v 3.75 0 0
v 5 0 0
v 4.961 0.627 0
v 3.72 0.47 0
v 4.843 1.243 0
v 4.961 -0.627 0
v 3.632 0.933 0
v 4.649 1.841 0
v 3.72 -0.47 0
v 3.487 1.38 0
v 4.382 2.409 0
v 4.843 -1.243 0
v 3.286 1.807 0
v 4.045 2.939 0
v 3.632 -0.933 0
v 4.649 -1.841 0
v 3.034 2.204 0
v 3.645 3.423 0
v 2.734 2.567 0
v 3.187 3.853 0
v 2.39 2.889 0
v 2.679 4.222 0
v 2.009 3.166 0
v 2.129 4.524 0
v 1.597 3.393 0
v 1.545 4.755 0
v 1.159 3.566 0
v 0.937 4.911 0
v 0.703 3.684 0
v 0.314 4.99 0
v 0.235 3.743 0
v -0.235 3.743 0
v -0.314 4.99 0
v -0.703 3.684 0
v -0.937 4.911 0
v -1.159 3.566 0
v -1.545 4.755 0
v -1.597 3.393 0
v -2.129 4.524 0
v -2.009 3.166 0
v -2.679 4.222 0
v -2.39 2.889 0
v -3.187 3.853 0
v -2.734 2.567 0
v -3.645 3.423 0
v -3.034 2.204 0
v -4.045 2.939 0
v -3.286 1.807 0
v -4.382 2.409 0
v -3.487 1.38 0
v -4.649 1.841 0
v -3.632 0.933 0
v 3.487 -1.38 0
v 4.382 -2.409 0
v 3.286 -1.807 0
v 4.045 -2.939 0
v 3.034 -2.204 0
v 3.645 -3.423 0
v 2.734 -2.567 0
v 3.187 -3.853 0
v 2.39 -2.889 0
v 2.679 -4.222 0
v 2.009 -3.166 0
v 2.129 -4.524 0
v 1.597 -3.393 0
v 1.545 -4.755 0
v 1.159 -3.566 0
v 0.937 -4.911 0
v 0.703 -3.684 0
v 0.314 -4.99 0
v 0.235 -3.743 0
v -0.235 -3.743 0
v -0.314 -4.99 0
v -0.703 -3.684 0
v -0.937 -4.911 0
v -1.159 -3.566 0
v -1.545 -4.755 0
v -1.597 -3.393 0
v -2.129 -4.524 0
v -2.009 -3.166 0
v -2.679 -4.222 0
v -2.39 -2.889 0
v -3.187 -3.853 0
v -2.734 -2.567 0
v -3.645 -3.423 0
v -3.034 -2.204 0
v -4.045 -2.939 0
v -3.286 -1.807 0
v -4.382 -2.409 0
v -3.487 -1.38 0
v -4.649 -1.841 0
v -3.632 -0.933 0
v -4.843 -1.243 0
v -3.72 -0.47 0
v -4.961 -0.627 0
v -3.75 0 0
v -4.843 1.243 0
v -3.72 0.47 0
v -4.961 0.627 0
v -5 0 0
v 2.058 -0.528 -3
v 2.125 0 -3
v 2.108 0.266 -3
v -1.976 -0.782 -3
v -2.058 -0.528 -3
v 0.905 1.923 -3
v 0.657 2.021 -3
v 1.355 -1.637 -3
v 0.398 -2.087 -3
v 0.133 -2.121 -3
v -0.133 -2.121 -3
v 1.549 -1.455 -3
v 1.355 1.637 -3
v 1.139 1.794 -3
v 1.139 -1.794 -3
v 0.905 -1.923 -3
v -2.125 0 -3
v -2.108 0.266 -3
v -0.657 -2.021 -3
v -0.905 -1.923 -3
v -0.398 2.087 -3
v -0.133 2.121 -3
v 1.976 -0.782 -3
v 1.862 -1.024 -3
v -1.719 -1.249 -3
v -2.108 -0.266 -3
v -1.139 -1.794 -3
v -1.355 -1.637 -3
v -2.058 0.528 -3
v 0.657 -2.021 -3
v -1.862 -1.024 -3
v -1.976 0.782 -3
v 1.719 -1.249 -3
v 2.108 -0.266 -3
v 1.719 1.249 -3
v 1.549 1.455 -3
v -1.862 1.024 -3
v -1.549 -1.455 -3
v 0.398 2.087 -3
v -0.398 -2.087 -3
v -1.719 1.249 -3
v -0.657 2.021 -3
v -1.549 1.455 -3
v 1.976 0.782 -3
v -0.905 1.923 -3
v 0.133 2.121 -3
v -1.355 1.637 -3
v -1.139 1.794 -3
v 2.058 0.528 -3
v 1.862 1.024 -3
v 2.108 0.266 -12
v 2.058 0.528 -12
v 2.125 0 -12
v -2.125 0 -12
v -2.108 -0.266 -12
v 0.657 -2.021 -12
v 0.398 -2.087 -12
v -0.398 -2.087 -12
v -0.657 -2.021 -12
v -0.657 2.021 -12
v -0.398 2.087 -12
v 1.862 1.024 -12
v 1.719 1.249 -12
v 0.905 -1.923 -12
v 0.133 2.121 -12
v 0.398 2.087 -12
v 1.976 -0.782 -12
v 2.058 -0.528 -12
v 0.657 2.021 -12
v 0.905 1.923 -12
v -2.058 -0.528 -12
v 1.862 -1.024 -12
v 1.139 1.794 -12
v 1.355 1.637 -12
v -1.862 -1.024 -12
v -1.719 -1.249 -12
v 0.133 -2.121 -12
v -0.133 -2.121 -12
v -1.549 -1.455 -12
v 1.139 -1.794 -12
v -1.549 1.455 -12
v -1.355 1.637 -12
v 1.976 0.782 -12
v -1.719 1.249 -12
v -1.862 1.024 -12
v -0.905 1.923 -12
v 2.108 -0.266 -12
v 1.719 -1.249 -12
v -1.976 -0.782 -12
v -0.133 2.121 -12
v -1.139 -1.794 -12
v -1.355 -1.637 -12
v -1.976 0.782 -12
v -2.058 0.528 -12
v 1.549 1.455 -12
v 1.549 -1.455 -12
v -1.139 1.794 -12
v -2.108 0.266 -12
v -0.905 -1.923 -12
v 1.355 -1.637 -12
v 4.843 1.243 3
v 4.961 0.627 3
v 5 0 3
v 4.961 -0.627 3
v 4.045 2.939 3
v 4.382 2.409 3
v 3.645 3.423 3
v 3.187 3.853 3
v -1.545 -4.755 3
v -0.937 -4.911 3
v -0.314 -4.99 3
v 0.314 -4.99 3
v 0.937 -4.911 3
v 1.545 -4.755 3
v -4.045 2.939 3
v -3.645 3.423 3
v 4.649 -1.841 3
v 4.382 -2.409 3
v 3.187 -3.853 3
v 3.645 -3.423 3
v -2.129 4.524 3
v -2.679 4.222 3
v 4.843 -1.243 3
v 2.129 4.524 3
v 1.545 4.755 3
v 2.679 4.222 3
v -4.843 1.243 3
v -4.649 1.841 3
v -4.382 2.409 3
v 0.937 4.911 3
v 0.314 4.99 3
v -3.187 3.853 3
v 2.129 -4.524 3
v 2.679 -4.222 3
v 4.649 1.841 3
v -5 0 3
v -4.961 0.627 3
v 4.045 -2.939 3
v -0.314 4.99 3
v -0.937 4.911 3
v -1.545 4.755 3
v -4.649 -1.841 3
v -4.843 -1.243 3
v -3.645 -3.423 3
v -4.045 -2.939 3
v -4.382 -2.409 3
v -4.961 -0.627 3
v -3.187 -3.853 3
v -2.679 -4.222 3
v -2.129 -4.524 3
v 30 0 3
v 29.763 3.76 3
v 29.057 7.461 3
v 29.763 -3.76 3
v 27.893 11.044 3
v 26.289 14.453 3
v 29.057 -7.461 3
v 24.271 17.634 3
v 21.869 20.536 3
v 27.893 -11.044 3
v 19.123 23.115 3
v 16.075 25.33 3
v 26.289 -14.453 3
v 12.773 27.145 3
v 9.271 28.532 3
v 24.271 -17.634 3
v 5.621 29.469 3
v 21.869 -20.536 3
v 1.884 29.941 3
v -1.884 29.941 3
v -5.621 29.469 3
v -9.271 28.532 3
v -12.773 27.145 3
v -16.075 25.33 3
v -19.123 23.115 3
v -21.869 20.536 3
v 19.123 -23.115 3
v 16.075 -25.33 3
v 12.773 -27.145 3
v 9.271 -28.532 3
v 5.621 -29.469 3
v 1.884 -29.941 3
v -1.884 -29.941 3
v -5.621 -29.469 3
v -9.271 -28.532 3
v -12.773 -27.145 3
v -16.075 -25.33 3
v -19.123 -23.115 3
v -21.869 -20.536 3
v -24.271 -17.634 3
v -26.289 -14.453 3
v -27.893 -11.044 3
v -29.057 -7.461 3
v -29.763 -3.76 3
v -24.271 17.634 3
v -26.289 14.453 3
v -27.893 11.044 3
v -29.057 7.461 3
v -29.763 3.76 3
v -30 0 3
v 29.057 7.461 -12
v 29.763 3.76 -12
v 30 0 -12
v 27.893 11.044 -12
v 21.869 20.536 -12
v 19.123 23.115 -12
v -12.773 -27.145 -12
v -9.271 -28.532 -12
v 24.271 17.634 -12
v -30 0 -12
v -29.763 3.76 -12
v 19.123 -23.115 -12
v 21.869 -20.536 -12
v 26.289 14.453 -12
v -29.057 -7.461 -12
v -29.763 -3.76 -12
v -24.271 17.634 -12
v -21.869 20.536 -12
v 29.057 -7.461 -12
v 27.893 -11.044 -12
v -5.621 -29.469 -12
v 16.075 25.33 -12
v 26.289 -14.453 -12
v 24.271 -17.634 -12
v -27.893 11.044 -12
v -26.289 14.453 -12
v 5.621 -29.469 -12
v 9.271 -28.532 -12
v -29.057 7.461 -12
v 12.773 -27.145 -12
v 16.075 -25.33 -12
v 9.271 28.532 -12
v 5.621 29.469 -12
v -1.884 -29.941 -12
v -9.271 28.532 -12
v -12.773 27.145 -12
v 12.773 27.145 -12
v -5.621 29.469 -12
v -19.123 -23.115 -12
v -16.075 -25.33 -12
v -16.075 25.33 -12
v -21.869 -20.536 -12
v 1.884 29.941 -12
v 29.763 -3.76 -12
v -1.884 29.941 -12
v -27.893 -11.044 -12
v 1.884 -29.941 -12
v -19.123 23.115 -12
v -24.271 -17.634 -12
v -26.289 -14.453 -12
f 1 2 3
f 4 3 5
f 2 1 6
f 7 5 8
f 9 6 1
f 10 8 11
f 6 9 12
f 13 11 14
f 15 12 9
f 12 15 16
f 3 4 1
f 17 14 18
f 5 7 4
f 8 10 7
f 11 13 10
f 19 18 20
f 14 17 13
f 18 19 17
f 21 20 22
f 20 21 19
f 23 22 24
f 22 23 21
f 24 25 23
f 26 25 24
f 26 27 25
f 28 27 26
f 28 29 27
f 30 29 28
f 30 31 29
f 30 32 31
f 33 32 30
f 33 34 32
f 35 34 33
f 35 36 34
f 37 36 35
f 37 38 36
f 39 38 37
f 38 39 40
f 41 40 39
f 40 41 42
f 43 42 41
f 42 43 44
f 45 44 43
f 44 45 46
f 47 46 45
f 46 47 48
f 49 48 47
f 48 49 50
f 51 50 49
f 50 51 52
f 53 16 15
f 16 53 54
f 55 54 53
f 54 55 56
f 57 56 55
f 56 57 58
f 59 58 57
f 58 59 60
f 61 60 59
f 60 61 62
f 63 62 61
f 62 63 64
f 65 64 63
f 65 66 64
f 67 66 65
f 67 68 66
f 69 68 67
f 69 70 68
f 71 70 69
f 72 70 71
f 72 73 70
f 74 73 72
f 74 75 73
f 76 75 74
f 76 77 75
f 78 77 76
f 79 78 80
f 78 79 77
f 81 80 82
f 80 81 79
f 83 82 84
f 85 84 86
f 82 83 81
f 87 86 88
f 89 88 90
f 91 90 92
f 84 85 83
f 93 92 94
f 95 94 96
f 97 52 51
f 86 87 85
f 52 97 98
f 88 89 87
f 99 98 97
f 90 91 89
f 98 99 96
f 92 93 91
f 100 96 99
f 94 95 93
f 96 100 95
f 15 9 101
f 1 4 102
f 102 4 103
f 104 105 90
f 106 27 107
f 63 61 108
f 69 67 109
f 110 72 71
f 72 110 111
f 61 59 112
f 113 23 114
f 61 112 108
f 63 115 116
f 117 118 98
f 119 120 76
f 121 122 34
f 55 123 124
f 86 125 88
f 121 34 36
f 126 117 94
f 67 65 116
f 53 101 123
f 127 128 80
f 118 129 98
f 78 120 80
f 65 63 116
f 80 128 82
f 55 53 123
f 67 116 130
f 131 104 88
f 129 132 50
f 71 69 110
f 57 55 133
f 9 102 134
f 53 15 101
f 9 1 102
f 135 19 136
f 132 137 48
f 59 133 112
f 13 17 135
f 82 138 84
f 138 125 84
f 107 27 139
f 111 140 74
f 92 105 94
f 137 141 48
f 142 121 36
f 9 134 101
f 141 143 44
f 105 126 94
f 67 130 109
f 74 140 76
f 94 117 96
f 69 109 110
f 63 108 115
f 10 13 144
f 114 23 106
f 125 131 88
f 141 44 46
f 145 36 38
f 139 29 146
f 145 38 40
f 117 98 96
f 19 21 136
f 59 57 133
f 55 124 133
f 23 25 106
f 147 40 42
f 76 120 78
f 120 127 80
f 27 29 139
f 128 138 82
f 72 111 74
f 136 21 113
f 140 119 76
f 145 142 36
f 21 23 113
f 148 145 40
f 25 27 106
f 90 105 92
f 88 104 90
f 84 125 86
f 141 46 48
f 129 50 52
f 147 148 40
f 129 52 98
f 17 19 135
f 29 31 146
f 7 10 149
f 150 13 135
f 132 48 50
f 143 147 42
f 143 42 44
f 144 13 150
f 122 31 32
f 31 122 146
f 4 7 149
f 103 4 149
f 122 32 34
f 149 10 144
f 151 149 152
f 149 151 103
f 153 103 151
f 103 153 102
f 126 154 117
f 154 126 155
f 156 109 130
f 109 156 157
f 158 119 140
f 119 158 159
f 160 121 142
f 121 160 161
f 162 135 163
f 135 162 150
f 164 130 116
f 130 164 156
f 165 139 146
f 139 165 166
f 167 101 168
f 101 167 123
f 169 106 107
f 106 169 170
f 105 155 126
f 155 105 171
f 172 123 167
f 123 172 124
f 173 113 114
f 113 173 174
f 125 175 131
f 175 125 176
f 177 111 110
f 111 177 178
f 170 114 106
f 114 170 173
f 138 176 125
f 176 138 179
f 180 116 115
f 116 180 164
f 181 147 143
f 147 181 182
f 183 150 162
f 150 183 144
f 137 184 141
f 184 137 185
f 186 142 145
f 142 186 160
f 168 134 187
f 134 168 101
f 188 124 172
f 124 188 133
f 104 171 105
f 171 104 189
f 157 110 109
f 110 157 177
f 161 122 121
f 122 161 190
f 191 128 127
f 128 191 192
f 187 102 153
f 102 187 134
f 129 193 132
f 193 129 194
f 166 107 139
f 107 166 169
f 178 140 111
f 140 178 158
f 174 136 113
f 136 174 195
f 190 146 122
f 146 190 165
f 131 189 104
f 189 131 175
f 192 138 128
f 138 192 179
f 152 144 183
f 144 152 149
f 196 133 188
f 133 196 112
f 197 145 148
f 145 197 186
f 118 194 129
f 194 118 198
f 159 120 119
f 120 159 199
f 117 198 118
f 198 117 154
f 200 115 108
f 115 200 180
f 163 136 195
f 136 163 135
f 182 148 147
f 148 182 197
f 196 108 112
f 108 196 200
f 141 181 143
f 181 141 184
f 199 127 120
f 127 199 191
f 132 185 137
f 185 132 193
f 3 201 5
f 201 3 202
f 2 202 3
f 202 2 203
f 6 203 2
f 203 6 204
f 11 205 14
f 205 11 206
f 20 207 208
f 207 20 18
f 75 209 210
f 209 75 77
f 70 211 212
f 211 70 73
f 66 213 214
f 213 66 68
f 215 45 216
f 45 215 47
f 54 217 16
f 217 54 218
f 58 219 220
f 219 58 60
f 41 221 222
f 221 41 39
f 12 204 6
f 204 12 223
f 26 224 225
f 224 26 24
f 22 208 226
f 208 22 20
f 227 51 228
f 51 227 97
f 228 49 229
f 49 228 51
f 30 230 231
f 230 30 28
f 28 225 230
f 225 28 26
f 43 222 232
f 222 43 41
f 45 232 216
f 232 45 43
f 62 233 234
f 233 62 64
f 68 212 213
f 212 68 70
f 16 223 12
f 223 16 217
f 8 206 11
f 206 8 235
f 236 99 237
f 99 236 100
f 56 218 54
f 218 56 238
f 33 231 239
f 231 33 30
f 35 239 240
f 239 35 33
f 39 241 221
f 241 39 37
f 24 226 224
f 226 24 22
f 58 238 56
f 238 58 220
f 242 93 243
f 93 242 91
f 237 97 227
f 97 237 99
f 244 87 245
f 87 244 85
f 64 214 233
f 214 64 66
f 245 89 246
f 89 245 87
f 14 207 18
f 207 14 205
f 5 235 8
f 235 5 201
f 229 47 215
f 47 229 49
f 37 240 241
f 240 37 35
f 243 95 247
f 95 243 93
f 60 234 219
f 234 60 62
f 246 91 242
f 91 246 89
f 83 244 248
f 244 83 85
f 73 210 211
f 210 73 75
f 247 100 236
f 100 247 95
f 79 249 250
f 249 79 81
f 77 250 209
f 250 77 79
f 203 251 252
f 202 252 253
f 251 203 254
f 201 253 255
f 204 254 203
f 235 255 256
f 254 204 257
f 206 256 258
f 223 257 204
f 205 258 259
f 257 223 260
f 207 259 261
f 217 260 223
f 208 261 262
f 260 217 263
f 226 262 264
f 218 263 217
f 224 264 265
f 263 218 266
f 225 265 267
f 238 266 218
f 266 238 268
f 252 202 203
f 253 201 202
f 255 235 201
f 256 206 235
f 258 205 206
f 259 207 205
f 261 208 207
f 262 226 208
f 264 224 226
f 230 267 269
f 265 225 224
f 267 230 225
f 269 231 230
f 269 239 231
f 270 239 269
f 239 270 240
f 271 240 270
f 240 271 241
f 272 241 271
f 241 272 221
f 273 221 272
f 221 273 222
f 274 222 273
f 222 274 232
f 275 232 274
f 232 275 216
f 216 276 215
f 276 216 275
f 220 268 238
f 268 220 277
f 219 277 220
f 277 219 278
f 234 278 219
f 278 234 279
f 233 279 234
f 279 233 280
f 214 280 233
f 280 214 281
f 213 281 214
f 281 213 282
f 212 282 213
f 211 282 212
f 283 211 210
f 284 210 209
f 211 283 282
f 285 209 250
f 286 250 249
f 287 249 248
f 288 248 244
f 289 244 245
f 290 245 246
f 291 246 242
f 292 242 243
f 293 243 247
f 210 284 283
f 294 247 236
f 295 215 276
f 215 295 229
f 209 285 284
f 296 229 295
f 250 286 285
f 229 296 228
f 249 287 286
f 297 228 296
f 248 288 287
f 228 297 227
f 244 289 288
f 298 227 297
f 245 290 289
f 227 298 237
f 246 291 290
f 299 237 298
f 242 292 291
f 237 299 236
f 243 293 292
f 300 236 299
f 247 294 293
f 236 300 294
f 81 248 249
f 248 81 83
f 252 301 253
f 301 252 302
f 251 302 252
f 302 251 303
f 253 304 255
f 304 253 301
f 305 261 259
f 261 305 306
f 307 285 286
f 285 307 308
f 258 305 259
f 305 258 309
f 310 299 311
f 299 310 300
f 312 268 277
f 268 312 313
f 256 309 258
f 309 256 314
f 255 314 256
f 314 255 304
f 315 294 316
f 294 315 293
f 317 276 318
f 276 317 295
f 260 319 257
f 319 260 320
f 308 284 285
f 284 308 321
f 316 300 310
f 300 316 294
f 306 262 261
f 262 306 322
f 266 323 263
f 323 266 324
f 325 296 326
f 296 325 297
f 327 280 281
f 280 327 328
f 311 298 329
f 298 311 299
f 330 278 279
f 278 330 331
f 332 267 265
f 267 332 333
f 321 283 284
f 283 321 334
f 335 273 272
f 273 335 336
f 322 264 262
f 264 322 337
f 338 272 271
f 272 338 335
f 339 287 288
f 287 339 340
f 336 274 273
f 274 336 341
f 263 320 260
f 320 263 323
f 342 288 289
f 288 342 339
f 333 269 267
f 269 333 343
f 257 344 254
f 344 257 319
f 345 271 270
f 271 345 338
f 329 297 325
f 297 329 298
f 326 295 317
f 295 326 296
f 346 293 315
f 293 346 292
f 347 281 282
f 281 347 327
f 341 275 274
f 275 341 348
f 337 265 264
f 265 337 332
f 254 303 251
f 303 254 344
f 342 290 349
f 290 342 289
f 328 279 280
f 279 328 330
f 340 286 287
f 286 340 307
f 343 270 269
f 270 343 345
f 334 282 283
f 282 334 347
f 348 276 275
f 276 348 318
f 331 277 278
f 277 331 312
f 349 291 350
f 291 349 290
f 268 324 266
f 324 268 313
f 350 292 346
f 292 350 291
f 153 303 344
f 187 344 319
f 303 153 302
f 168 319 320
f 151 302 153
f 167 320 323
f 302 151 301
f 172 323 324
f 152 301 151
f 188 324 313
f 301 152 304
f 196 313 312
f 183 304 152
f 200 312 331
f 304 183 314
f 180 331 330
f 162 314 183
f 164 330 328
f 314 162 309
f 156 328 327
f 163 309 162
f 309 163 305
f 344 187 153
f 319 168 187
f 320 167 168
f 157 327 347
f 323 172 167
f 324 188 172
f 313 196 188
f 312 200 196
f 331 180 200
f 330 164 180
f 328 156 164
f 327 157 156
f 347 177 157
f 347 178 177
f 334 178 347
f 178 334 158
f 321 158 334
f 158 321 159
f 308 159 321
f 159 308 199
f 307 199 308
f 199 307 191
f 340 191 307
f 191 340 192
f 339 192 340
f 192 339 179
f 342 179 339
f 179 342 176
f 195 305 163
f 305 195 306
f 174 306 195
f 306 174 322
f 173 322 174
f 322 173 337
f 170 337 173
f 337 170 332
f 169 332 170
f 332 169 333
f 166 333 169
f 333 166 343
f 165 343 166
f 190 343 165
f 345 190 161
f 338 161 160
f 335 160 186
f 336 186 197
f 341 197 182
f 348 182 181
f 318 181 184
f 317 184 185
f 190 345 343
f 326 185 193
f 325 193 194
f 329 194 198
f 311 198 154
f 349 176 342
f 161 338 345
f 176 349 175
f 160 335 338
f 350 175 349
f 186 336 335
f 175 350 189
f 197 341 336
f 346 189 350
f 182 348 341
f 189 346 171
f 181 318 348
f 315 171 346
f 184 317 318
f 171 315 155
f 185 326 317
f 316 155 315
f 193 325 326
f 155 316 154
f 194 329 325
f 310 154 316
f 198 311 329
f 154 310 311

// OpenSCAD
$fn = 50;


difference() {
	union() {
		translate(v = [0, 0, -12.0000000000]) {
			cylinder(h = 15, r = 30.0000000000);
		}
	}
	union() {
		translate(v = [0, 0, 0]) {
			rotate(a = [0, 0, 0]) {
				difference() {
					union() {
						translate(v = [0, 0, -15.0000000000]) {
							cylinder(h = 15, r = 2.0000000000);
						}
						translate(v = [0, 0, -3]) {
							cylinder(h = 3, r1 = 2.1250000000, r2 = 3.7500000000);
						}
						translate(v = [0, 0, -15.0000000000]) {
							cylinder(h = 15, r = 2.1250000000);
						}
						translate(v = [0, 0, -15.0000000000]) {
							cylinder(h = 15, r = 2.0000000000);
						}
					}
					union();
				}
			}
		}
		#cylinder(h = 3, r = 5.0000000000);
	}
}
